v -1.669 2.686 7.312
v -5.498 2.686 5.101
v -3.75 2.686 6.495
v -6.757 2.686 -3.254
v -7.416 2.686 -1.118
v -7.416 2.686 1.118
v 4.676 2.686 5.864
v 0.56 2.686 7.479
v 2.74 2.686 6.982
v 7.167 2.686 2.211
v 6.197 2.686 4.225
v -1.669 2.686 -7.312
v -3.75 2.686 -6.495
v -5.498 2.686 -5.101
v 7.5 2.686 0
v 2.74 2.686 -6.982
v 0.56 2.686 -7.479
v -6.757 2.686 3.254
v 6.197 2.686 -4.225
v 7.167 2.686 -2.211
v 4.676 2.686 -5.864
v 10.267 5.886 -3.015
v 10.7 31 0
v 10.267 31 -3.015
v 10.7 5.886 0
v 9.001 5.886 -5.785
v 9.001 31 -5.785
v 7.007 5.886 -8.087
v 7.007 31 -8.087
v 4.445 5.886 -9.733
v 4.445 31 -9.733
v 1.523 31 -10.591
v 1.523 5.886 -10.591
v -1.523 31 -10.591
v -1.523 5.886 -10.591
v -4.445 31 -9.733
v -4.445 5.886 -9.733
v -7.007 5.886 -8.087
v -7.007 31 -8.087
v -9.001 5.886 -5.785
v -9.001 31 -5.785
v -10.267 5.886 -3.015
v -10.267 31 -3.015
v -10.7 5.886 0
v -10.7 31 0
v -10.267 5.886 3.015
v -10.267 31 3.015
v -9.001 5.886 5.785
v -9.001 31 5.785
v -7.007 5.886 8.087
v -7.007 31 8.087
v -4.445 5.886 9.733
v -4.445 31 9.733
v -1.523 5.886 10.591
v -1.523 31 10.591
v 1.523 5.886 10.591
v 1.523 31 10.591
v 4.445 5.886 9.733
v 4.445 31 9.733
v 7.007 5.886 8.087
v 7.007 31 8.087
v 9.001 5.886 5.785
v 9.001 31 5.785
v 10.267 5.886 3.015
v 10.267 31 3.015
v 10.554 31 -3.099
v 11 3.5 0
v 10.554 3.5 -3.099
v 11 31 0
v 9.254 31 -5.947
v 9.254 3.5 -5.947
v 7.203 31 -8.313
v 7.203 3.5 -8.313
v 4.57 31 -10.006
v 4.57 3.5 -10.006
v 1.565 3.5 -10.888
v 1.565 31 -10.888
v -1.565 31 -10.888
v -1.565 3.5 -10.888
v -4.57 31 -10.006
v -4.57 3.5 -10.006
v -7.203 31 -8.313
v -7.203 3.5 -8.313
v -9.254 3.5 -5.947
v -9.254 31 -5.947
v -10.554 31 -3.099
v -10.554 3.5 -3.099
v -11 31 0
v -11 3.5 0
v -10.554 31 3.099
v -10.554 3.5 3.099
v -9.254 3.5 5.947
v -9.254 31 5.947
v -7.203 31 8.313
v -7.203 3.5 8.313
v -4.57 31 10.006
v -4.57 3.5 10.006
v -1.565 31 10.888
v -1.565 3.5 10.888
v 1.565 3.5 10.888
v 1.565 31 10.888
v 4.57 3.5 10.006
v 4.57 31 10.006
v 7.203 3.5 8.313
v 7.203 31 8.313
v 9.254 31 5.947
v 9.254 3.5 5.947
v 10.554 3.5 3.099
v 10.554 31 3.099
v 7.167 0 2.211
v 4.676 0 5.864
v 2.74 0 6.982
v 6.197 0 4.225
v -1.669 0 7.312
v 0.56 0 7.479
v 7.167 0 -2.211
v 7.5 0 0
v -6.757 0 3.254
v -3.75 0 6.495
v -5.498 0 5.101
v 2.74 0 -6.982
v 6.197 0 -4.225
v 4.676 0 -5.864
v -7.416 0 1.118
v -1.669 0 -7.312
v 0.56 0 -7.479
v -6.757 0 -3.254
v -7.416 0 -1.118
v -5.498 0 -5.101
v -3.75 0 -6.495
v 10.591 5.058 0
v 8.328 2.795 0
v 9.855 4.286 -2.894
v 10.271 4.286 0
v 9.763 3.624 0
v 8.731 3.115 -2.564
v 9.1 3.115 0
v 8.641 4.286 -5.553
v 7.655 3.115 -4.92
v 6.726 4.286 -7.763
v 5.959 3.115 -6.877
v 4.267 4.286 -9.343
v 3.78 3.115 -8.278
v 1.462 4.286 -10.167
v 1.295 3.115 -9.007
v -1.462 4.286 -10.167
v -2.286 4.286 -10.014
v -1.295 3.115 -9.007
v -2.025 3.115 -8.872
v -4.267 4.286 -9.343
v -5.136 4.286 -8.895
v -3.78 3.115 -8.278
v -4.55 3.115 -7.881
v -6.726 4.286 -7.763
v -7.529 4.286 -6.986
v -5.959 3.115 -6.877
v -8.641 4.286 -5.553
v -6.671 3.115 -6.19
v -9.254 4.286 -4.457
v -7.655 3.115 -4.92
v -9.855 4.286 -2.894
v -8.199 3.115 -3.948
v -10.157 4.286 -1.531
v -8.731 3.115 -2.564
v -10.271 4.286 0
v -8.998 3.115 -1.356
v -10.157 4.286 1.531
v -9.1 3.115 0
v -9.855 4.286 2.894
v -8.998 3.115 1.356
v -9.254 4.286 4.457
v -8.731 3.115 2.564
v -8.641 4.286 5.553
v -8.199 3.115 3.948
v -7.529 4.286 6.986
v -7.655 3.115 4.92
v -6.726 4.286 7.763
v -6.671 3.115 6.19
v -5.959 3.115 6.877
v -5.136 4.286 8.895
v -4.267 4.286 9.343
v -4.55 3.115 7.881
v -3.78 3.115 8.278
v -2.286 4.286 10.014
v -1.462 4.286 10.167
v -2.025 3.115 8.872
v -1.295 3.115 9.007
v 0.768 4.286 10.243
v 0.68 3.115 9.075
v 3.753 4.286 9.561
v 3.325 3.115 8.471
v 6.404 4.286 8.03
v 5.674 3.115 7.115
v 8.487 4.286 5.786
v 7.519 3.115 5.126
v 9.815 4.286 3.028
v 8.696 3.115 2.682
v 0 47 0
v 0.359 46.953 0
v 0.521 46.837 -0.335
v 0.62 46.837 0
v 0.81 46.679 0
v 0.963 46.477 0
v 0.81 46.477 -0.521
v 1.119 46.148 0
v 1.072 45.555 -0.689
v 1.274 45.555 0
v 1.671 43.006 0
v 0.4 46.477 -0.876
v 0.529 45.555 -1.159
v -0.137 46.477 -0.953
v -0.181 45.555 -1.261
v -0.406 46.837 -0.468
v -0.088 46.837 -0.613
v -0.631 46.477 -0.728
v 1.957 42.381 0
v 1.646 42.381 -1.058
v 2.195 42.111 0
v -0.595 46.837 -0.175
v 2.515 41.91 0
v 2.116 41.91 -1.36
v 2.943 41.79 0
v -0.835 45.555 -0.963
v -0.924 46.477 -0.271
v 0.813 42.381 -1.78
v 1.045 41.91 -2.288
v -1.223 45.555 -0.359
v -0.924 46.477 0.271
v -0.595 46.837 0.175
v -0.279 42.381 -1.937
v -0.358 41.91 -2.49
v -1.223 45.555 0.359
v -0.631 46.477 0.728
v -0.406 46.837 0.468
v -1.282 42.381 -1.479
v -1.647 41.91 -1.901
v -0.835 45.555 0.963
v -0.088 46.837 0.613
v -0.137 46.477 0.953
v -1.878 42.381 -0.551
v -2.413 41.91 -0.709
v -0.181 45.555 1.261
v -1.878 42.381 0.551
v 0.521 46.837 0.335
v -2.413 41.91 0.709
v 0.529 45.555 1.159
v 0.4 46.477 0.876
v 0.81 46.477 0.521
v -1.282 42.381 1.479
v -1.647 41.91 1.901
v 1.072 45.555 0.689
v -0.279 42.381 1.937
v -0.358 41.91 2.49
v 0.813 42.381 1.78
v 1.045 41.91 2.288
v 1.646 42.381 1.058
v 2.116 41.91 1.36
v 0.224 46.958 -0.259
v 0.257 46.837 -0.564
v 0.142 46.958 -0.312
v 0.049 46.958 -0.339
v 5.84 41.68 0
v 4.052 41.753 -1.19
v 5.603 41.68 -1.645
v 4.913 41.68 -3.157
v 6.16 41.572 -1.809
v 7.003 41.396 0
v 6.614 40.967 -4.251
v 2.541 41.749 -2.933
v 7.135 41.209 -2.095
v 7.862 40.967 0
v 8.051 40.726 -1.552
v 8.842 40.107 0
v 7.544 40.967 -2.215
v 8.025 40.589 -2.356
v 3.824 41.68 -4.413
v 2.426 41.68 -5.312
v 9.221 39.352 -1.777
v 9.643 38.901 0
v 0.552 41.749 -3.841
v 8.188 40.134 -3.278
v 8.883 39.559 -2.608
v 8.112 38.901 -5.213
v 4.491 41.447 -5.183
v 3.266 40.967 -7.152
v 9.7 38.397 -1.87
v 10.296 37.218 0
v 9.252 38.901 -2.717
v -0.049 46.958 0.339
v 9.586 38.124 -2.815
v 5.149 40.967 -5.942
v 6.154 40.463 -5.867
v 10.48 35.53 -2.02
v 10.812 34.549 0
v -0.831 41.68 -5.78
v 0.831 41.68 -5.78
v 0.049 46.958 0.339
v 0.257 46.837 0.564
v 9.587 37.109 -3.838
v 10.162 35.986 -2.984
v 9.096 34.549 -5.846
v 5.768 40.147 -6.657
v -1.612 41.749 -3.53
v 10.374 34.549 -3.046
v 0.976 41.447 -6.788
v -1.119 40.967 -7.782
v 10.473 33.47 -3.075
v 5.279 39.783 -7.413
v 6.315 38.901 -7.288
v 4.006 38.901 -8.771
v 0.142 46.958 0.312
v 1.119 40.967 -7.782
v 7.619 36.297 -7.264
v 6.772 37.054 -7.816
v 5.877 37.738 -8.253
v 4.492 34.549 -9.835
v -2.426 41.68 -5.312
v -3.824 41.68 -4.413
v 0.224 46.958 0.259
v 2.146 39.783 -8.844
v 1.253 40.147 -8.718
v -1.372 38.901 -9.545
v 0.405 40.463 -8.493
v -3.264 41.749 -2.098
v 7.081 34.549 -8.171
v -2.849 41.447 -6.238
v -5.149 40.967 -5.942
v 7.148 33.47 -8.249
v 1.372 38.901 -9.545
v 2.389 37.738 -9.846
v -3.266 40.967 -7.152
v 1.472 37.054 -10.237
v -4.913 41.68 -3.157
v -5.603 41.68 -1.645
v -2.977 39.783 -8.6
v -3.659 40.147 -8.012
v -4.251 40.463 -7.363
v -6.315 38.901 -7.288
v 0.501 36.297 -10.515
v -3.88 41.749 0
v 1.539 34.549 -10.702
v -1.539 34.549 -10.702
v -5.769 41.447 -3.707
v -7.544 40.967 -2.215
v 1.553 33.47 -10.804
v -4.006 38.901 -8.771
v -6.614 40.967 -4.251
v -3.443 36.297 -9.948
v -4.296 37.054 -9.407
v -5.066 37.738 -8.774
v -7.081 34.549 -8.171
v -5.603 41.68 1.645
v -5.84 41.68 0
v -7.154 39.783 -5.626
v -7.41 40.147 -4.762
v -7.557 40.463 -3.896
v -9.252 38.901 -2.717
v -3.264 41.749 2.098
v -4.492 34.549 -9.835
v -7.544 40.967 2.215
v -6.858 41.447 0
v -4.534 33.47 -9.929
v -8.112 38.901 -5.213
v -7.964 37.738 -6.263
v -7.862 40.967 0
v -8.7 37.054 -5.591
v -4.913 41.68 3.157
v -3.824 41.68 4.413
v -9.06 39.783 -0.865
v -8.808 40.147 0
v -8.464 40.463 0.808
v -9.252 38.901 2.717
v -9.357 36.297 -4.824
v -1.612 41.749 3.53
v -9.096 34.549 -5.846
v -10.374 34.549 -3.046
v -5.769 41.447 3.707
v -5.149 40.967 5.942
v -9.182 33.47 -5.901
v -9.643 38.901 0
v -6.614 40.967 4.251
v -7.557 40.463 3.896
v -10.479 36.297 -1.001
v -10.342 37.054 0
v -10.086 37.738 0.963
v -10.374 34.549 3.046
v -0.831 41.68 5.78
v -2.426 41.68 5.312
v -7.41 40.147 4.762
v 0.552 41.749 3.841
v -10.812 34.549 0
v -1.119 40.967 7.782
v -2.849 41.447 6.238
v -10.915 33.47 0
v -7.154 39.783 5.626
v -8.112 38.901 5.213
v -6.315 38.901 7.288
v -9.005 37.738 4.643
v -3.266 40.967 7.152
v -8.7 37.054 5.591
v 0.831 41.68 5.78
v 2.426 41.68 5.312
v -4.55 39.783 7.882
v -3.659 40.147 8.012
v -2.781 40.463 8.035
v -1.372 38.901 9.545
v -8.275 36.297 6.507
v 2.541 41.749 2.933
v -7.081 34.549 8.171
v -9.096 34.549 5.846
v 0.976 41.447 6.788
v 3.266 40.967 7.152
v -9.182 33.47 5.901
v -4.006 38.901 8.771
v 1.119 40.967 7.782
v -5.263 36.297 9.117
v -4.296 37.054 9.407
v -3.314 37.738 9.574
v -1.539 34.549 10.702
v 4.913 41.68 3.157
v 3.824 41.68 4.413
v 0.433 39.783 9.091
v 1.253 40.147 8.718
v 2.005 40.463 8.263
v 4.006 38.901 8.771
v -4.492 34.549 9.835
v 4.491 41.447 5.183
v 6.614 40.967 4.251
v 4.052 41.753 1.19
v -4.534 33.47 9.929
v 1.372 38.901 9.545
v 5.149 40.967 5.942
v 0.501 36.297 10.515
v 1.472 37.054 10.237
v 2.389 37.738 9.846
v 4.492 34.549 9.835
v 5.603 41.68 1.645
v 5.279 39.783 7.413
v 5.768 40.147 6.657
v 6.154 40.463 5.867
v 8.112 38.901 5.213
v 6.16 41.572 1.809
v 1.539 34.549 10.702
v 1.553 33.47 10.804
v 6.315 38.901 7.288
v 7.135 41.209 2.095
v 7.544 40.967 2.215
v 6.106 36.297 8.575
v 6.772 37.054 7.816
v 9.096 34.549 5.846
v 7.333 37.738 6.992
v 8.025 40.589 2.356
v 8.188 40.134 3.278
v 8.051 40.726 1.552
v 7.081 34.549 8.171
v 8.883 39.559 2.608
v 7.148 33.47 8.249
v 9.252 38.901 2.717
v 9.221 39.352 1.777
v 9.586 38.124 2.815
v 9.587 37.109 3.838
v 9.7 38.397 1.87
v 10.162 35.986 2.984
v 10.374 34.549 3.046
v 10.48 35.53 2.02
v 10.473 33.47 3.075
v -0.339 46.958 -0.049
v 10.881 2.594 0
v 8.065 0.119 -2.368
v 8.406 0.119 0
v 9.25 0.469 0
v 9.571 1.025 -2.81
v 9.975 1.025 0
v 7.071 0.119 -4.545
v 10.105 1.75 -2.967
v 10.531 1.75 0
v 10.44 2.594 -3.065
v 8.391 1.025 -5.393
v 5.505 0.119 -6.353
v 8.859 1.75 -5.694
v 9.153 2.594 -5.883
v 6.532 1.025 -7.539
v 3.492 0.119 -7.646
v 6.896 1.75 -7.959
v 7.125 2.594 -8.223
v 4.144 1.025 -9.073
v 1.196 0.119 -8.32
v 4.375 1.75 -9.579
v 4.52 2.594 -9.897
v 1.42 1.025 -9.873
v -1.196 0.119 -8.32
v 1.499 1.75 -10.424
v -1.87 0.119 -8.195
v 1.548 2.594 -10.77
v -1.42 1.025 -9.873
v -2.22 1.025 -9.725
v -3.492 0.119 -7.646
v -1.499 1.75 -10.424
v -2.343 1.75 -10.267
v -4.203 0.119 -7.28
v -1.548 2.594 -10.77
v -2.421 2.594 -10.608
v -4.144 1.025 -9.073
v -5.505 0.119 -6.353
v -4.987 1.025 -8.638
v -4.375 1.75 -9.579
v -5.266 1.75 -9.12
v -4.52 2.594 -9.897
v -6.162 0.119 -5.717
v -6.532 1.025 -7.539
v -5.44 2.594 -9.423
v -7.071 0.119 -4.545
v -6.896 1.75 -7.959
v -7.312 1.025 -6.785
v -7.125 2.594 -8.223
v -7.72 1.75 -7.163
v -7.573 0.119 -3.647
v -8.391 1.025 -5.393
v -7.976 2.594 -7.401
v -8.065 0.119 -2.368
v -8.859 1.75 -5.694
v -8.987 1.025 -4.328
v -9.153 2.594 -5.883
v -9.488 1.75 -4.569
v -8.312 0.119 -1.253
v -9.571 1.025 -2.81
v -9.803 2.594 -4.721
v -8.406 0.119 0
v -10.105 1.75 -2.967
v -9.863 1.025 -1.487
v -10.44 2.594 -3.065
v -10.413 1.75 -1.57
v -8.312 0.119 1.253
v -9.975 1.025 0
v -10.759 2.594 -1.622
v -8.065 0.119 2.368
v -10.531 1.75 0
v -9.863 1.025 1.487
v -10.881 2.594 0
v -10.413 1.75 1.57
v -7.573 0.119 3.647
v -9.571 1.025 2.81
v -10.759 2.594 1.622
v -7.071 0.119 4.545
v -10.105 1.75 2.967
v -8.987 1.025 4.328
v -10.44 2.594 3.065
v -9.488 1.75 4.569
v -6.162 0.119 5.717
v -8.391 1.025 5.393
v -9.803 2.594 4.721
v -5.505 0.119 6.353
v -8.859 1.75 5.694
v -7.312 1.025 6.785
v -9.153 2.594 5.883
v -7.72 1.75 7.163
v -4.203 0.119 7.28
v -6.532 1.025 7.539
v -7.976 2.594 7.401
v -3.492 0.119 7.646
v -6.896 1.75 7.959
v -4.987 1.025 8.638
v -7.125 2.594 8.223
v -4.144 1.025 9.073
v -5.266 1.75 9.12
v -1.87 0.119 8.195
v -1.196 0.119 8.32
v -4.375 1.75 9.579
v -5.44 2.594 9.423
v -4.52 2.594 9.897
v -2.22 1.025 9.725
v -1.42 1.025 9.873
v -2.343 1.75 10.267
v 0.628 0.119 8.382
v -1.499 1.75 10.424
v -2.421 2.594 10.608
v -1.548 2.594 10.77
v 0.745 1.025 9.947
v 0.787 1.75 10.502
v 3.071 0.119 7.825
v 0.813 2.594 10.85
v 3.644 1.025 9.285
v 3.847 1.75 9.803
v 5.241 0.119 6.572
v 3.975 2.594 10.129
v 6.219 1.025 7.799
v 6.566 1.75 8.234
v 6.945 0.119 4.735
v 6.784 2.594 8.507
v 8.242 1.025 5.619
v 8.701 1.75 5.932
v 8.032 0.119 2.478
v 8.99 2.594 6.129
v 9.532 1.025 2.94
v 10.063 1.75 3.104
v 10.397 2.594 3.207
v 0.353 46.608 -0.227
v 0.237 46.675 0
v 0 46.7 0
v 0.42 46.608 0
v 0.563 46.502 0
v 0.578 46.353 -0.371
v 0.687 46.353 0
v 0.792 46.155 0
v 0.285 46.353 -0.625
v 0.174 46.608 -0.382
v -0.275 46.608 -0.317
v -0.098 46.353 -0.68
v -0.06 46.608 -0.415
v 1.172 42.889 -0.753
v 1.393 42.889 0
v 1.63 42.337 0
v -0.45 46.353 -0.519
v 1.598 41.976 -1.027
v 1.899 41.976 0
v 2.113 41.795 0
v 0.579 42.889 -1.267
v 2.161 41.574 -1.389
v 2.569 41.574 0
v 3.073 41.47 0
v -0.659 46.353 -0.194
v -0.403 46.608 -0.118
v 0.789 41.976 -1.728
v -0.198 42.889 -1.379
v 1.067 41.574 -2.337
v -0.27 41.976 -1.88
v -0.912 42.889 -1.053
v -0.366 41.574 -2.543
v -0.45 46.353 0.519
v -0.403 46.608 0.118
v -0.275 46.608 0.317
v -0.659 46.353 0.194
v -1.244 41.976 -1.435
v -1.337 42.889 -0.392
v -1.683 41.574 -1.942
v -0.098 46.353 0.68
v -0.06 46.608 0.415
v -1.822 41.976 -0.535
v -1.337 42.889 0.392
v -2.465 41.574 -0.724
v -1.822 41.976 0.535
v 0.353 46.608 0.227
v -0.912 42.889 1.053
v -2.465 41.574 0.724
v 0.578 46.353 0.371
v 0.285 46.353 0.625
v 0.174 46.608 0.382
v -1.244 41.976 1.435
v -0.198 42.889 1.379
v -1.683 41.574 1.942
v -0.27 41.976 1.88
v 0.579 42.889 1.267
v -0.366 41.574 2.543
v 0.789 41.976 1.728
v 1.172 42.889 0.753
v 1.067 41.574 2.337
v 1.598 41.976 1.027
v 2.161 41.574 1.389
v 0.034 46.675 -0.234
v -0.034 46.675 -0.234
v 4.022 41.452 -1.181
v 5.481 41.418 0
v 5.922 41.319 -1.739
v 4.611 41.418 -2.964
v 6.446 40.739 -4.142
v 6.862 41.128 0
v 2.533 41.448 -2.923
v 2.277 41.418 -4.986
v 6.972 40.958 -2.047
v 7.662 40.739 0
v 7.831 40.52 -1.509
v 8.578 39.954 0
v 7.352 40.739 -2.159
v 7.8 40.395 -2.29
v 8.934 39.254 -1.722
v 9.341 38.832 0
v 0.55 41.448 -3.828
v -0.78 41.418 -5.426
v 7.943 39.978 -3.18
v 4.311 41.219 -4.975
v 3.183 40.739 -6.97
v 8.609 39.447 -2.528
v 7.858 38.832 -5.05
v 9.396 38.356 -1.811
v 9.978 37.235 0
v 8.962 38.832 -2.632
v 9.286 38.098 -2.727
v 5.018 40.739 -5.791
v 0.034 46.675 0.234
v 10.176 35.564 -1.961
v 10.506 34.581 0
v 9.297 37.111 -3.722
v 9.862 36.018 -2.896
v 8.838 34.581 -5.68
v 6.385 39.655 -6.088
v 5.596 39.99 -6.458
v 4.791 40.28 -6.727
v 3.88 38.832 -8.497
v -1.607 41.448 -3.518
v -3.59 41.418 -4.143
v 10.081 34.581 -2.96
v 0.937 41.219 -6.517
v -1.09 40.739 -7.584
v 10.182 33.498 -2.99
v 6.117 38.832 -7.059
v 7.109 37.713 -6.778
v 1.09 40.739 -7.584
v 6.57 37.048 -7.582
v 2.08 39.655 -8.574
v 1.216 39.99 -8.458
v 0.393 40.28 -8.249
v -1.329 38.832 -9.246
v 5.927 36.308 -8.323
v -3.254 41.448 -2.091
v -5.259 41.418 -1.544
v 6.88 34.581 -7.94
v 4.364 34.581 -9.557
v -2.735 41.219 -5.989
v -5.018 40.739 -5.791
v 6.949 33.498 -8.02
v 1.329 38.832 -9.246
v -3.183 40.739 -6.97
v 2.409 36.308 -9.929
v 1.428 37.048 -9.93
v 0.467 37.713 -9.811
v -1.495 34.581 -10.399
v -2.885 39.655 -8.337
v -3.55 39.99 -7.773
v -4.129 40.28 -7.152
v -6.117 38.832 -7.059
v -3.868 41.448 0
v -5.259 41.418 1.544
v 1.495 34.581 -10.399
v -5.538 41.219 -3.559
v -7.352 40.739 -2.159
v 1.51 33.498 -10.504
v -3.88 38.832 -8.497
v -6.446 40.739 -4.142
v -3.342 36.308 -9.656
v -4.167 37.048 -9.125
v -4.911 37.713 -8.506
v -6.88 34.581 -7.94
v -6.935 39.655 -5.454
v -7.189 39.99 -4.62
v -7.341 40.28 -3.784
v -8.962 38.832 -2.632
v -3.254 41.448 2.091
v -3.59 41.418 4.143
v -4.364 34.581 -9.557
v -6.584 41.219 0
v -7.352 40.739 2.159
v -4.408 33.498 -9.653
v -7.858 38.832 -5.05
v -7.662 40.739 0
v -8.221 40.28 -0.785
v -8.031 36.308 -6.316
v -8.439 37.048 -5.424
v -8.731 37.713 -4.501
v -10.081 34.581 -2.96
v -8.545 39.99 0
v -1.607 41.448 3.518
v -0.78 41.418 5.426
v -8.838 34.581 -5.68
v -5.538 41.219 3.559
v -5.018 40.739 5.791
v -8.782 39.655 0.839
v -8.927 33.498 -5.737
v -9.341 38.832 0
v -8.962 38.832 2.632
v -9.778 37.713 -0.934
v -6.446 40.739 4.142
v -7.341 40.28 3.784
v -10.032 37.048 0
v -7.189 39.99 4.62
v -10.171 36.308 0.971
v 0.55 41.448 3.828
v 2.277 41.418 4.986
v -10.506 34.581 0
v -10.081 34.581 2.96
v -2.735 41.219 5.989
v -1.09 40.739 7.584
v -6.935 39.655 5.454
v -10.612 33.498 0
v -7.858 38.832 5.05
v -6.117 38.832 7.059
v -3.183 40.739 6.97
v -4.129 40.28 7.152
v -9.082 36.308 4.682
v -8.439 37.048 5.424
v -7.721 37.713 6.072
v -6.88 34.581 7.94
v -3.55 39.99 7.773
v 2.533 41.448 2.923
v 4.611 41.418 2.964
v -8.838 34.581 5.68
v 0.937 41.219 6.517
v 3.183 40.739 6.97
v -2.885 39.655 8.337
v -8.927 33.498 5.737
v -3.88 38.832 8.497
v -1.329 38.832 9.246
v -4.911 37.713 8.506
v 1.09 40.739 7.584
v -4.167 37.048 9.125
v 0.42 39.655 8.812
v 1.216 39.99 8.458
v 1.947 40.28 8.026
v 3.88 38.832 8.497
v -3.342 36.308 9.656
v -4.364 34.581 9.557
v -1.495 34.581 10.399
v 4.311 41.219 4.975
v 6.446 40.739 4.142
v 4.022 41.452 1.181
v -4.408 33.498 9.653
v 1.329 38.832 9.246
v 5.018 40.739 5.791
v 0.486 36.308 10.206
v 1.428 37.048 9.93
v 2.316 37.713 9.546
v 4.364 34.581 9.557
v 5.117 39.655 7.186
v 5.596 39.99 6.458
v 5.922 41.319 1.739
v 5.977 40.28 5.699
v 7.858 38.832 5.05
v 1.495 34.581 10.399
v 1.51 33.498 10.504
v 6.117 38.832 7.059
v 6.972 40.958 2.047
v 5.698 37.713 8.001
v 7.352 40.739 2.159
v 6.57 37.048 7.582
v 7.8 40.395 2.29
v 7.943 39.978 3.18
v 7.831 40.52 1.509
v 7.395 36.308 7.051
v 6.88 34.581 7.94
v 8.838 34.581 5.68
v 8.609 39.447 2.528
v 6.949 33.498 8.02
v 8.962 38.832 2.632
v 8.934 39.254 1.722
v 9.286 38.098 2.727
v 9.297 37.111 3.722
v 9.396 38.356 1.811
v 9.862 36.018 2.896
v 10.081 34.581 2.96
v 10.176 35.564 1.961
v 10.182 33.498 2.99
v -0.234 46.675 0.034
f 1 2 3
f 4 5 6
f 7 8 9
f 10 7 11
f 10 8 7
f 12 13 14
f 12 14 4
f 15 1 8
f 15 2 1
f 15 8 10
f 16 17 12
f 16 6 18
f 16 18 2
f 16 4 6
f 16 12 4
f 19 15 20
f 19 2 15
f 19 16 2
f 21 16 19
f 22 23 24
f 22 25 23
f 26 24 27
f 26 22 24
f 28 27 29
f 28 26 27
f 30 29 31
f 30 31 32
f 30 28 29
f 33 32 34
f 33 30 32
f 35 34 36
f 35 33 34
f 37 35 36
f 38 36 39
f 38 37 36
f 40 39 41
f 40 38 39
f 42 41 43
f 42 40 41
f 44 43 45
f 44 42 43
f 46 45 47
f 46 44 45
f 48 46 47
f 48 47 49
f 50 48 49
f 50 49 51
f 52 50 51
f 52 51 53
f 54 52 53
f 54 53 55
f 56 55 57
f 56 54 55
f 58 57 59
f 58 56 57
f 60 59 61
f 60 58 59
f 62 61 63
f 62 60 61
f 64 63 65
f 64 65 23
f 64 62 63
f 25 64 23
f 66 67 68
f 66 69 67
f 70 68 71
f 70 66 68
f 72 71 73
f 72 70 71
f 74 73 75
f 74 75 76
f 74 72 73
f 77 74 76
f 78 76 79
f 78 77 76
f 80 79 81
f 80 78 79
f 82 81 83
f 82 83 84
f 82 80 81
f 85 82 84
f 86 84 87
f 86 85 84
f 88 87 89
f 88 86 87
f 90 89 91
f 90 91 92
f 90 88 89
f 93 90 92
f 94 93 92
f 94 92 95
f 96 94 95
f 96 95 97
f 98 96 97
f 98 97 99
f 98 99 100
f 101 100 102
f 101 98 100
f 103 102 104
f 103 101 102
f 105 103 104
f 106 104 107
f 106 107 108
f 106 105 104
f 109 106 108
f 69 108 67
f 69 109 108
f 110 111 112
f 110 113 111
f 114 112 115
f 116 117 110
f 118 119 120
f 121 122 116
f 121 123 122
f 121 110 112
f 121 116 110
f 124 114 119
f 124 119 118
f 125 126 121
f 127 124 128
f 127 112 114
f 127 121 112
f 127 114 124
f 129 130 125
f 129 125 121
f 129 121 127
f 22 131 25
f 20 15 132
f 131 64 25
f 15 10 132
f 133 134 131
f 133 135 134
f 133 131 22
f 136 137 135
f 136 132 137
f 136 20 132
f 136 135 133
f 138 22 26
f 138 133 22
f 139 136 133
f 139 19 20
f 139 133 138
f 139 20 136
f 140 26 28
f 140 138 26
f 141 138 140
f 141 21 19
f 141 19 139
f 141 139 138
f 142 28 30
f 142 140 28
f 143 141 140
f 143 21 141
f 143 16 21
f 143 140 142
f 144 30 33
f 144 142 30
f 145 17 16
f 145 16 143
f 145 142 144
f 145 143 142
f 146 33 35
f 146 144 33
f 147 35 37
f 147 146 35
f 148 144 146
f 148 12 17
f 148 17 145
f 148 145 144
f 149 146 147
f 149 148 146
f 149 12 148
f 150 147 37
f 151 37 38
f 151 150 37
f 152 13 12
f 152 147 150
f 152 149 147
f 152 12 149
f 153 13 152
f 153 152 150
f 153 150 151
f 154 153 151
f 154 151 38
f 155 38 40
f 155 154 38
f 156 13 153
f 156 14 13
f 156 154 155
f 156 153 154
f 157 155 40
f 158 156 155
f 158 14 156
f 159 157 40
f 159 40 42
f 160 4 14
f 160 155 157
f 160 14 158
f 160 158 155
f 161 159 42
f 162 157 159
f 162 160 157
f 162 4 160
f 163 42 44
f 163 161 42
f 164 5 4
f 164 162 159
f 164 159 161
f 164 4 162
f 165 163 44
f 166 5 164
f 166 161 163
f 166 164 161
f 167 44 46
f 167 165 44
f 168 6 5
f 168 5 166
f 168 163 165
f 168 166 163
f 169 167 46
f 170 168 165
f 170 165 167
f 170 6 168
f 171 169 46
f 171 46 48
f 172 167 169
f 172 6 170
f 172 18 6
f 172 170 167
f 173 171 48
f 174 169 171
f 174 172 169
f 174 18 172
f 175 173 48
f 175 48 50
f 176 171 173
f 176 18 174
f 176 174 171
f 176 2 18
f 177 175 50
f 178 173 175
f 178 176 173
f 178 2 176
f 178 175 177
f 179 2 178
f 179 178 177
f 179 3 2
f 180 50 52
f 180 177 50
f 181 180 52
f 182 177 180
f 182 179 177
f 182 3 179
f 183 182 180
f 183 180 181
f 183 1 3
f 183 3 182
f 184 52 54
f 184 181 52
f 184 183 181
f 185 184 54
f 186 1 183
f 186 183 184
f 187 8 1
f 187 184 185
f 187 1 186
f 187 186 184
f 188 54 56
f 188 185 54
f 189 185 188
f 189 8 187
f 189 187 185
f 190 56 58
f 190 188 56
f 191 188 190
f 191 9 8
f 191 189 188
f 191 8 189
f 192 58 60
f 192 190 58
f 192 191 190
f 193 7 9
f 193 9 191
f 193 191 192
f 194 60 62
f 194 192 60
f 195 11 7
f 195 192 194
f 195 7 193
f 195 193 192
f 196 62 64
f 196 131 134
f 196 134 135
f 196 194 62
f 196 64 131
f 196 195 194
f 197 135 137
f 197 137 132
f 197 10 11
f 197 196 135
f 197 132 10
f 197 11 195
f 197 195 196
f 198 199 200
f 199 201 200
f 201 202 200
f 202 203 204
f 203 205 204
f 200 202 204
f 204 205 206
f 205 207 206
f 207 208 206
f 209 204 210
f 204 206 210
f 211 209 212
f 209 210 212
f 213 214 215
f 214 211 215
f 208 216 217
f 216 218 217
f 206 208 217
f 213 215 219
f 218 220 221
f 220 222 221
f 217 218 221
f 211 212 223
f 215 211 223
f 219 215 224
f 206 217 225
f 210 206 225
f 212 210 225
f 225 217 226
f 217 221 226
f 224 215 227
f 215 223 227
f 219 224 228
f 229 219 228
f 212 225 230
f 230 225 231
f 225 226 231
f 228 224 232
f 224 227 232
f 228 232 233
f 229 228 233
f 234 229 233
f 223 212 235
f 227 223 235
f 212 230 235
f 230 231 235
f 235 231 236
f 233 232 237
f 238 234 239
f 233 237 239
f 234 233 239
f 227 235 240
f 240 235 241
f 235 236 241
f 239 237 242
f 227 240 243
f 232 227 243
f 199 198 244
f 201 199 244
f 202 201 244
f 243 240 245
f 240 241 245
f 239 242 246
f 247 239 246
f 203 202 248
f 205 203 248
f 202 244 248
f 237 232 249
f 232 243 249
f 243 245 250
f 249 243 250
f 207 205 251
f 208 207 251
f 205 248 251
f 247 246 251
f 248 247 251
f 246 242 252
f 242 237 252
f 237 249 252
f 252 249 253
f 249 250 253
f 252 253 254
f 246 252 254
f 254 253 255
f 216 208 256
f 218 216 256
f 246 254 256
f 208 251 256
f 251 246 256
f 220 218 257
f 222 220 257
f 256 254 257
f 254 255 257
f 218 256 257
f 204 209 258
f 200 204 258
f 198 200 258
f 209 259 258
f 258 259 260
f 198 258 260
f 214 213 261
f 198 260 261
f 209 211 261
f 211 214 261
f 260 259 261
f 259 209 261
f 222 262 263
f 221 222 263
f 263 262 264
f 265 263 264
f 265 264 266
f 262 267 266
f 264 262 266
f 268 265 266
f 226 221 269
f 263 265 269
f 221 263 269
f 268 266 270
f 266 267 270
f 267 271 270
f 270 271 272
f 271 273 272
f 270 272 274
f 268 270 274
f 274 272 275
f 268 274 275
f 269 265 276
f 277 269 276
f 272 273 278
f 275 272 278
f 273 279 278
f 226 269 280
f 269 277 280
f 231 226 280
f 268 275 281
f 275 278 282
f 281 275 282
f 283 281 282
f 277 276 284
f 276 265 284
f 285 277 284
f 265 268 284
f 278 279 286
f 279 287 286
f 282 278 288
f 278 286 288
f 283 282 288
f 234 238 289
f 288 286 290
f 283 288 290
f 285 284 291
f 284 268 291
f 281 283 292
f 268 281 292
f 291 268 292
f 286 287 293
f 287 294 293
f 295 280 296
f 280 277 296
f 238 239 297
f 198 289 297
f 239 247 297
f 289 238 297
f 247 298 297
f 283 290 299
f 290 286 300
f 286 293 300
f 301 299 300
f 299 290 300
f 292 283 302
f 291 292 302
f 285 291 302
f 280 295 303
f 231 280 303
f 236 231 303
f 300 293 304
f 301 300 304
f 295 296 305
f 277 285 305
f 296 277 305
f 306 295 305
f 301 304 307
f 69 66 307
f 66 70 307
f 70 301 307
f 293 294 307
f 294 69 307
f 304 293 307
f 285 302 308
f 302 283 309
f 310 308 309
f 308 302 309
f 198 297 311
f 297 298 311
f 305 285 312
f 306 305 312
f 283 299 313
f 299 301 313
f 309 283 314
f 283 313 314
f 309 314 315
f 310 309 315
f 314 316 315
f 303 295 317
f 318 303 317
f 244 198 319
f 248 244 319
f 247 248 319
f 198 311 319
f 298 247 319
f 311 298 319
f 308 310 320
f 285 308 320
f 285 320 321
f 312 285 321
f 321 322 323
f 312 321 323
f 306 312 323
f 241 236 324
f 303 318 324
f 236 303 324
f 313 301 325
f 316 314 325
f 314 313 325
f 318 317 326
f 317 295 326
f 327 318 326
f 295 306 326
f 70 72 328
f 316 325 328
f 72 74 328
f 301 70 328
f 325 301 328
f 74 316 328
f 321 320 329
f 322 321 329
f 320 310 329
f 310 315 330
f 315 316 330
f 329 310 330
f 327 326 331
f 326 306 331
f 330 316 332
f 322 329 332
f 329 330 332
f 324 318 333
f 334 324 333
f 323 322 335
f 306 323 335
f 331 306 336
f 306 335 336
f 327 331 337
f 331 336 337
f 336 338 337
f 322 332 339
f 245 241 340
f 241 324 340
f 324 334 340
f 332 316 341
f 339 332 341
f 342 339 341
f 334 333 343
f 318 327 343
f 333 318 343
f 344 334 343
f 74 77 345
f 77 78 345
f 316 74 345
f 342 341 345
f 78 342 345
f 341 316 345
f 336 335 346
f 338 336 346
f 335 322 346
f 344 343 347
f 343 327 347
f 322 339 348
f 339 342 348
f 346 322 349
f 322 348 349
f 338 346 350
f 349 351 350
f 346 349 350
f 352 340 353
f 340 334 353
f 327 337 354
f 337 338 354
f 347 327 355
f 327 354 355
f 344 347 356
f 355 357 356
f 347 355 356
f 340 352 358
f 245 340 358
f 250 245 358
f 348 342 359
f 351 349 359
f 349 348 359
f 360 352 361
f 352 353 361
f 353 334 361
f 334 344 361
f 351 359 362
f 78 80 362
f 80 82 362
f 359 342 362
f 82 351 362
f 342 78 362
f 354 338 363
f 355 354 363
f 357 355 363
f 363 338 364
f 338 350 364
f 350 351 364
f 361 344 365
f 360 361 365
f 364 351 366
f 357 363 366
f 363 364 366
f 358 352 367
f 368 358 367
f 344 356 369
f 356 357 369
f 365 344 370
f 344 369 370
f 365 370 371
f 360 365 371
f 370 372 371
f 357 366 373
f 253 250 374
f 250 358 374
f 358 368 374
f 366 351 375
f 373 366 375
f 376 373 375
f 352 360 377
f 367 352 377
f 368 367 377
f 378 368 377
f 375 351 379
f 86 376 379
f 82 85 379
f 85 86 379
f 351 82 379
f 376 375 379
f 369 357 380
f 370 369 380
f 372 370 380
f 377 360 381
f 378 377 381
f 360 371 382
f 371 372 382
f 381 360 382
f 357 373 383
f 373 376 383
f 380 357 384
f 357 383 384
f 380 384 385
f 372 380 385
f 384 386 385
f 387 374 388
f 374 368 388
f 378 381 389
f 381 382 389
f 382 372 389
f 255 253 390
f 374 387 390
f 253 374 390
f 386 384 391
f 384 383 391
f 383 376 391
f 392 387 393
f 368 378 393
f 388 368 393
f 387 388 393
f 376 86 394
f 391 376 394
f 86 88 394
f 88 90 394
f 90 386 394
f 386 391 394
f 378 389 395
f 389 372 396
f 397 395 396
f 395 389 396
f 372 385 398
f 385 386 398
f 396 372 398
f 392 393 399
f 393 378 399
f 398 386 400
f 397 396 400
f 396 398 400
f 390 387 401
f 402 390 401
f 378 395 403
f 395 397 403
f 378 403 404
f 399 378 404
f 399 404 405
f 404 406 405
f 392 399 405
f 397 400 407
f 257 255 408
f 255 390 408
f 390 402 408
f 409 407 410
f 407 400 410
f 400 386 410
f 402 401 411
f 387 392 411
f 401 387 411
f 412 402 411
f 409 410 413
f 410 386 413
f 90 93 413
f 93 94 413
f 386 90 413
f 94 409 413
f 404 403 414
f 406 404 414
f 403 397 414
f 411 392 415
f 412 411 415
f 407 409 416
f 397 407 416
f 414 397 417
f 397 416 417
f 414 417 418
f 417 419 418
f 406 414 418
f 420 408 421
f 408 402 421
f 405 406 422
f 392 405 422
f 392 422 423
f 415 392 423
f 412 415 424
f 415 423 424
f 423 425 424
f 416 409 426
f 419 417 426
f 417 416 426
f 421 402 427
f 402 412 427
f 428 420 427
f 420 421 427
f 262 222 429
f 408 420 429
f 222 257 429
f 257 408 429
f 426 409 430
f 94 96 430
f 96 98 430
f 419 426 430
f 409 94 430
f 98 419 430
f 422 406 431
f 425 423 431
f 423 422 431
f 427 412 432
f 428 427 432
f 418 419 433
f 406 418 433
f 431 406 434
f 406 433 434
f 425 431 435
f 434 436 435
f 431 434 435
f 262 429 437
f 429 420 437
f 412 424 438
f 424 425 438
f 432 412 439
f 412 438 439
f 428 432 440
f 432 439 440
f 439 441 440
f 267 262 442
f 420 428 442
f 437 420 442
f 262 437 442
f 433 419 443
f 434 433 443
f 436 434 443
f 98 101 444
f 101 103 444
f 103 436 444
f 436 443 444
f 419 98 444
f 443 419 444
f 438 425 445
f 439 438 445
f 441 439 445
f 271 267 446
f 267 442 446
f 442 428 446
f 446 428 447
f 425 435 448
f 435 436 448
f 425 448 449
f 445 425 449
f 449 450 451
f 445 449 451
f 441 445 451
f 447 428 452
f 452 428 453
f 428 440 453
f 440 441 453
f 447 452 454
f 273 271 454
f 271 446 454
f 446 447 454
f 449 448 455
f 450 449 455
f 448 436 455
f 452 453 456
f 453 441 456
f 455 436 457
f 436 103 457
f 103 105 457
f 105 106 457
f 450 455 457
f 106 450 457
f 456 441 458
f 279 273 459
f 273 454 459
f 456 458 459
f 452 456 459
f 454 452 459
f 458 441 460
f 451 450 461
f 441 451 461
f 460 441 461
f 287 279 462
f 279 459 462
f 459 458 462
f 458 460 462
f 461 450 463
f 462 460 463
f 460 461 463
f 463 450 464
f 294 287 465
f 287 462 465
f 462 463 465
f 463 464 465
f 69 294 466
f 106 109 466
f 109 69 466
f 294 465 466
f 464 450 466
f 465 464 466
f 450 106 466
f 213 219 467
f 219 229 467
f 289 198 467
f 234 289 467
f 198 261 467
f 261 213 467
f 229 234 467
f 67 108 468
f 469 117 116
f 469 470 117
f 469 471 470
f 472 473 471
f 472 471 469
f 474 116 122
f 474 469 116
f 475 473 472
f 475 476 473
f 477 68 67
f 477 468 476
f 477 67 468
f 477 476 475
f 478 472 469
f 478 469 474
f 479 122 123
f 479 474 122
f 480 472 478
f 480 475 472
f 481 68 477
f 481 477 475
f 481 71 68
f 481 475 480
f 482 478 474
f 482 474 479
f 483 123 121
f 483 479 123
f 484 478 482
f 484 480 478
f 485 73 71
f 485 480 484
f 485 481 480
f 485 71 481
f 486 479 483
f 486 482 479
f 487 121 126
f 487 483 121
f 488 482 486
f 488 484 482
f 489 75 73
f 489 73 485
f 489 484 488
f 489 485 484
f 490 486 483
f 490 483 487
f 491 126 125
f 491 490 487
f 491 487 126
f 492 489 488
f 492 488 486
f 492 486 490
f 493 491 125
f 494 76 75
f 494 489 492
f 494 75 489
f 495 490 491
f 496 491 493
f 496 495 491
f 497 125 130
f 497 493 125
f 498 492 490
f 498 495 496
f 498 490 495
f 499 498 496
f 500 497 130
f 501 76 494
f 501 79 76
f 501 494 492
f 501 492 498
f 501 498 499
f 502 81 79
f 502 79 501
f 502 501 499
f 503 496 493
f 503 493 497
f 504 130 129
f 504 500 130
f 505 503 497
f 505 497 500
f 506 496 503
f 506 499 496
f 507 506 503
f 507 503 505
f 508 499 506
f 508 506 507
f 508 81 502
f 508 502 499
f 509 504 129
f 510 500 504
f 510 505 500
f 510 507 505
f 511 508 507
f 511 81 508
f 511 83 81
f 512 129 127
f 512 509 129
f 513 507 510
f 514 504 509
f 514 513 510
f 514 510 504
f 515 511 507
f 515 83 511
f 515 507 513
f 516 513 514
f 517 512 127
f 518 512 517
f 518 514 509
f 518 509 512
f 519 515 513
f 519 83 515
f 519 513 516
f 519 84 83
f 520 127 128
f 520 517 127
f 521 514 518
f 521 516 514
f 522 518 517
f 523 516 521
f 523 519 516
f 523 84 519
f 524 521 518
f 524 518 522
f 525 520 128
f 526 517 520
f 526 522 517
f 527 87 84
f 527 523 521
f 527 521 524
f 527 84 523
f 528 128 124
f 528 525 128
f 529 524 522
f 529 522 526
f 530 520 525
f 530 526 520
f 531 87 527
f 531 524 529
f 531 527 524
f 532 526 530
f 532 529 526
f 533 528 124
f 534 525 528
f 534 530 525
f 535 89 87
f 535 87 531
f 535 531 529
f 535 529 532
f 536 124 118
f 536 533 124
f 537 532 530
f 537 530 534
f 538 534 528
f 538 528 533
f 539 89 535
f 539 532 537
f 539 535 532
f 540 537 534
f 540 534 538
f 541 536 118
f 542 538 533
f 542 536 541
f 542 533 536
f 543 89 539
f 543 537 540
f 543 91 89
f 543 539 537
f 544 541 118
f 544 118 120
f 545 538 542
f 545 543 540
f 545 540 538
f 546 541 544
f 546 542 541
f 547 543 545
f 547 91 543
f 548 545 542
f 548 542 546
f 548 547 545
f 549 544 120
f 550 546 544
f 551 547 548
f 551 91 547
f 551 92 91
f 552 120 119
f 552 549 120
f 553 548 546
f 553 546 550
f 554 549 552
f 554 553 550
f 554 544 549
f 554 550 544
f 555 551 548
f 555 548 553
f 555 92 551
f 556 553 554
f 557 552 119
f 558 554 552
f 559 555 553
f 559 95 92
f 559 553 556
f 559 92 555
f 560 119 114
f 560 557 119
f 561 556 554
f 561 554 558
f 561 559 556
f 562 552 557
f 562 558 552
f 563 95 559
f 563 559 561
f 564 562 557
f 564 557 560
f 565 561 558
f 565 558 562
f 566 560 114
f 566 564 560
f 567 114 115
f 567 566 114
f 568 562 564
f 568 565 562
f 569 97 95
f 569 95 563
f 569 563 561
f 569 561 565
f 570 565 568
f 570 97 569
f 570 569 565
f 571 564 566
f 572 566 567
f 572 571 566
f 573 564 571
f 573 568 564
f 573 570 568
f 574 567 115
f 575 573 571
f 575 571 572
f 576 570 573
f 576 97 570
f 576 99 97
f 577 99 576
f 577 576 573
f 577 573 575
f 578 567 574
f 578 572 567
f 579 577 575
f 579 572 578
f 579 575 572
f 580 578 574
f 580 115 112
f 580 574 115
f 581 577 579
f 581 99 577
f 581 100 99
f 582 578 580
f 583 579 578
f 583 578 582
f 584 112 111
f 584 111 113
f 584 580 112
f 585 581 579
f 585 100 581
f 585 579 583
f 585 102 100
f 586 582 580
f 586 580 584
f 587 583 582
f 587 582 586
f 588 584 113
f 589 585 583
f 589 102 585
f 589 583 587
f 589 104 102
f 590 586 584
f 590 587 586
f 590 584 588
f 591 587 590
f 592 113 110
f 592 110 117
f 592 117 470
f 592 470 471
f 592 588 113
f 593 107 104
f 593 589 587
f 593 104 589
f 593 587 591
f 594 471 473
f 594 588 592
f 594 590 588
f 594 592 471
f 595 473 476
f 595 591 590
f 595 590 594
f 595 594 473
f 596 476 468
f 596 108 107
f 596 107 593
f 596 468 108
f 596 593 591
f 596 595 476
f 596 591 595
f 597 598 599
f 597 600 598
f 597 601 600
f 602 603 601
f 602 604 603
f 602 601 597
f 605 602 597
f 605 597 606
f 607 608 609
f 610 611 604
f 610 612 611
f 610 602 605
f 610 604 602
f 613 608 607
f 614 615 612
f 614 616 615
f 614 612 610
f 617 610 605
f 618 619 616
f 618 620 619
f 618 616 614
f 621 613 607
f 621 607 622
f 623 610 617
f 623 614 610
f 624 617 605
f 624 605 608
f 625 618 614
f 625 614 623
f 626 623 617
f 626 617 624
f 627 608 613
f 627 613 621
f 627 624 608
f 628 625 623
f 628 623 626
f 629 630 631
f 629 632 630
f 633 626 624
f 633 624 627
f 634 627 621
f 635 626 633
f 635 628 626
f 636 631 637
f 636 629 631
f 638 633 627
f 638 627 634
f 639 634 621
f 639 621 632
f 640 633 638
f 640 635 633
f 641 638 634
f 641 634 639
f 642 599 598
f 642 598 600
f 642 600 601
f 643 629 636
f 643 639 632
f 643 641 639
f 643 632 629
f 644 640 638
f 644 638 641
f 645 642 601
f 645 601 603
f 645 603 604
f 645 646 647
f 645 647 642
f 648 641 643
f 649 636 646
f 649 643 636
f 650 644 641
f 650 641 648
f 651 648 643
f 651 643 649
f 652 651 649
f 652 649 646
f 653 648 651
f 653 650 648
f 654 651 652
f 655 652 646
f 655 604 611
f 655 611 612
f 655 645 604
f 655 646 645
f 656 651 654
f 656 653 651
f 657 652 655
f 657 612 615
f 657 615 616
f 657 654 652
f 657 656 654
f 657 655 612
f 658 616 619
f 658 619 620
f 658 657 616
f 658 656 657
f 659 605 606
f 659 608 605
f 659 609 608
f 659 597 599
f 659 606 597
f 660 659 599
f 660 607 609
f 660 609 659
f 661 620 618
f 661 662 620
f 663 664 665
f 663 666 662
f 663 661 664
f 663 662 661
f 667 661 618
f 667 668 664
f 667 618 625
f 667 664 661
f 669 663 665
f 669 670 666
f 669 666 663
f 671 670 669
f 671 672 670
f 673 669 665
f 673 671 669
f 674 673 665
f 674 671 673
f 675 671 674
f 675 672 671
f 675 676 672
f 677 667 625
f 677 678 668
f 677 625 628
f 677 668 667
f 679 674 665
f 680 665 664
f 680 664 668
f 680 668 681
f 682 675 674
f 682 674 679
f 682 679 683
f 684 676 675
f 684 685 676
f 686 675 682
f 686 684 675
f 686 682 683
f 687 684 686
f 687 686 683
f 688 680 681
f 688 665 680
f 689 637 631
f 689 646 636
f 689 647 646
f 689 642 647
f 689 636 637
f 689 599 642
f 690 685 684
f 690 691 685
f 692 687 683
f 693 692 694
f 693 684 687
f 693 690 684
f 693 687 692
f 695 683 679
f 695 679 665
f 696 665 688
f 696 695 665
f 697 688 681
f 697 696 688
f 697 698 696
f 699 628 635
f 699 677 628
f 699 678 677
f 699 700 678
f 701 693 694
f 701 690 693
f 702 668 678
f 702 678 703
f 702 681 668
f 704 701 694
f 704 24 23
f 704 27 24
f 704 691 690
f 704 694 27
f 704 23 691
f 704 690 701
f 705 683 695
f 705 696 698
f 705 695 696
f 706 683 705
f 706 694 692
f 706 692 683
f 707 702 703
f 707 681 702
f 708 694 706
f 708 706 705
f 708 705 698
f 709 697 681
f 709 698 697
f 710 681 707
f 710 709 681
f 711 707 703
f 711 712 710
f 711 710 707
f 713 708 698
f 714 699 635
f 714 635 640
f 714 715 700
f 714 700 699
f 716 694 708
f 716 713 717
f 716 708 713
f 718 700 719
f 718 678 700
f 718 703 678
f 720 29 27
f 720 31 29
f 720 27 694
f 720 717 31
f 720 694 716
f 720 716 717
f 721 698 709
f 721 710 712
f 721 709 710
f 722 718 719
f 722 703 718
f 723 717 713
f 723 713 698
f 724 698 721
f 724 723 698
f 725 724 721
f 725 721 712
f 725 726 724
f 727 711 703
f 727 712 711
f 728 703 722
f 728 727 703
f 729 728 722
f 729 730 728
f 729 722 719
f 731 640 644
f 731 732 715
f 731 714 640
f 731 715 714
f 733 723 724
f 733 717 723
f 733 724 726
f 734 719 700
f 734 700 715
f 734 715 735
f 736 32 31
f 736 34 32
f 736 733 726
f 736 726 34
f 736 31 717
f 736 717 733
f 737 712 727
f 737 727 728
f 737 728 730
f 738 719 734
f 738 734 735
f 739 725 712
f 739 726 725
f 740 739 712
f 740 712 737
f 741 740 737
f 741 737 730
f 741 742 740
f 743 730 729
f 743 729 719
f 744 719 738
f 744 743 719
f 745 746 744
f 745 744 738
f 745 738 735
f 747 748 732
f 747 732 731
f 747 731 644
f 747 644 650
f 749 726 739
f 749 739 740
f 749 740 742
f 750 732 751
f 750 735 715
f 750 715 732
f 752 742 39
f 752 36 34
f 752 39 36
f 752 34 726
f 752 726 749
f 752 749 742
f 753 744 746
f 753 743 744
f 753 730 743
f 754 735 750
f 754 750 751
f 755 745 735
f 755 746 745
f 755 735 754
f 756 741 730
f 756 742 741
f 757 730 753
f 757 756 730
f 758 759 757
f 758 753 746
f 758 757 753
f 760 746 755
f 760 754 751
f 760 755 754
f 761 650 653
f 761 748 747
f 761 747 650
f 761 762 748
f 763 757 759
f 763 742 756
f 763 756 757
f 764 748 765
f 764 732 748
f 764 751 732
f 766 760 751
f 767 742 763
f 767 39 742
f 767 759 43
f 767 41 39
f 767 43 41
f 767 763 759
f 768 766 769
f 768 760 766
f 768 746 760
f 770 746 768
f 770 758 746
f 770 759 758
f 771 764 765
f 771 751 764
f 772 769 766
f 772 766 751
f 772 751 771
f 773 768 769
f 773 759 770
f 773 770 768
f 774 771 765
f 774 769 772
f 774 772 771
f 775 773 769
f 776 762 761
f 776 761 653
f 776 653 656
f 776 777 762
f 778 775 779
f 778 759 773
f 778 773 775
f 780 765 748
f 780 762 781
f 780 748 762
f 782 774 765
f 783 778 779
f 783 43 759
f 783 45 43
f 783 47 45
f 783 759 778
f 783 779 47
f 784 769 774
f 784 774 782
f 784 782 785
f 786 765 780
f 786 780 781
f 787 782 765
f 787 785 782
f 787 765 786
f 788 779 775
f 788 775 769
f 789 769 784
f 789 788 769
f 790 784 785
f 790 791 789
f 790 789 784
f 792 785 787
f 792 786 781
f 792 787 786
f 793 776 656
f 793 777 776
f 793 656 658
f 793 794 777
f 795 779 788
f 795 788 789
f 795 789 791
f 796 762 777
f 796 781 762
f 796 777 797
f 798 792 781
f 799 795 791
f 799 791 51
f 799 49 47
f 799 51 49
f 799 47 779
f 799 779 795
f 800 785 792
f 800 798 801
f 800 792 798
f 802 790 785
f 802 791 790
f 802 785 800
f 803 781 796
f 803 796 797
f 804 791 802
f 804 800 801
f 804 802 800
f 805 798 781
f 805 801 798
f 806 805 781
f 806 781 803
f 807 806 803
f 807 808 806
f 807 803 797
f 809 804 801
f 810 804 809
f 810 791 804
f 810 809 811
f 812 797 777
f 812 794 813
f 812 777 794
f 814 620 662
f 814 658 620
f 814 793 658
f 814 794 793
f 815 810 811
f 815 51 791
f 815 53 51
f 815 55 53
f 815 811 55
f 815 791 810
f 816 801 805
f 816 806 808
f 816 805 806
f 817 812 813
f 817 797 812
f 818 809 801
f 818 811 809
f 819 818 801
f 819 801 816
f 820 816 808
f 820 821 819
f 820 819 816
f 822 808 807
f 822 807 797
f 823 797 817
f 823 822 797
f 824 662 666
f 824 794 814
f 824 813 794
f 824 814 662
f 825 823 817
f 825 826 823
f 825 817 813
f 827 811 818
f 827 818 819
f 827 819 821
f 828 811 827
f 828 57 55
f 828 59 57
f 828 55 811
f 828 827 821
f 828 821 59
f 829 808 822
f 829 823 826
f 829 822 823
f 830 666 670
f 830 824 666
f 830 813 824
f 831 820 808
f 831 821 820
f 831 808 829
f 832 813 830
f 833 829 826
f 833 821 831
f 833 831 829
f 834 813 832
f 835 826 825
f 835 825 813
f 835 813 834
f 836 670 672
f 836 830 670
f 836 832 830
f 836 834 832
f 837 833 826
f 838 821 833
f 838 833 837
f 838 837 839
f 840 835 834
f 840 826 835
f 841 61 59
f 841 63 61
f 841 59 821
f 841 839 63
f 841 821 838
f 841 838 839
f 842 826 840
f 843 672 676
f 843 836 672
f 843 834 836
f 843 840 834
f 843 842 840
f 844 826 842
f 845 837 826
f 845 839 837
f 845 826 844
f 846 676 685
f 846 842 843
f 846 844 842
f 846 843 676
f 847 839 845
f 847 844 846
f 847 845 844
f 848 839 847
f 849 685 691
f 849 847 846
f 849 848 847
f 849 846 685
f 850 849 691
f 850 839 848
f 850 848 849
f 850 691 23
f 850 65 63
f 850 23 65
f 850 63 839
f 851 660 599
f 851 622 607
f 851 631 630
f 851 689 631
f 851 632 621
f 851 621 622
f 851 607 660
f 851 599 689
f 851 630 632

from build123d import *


with BuildPart() as part:
    # Sketch1 → Revolve1 (revolve)
    with BuildSketch(Plane.XY):
        with BuildLine():
            Line((0, 0), (7.5, 0))
            ThreePointArc((7.5, 0), (9.974873734, 1.025126266), (11, 3.5))
            Line((11, 3.5), (11, 31))
            add(Edge.make_bspline(
                [(0, 47), (1.868508868, 47), (0.839979319, 43.098036716), (3.690772078, 40.909332335), (11, 43.731932555), (11, 31)],
                knots=[0, 0, 0, 0, 0.457352926, 0.557352926, 1, 1, 1, 1], degree=3))
            Line((0, 47), (0, 46.7))
            add(Edge.make_bspline(
                [(0, 46.7), (0.089835783, 46.7), (0.286730482, 46.675440139), (0.526826616, 46.561370695), (0.862385089, 46.18251662), (1.044651981, 45.207868135), (1.153282995, 44.076896377), (1.27957898, 43.224881421), (1.526130511, 42.440350235), (2.004678842, 41.769741959), (2.893610253, 41.423589513), (4.086898349, 41.455426541), (5.493916716, 41.46358206), (6.96424187, 41.18629835), (8.123784424, 40.497710935), (8.965606732, 39.51470229), (9.535509298, 38.514305141), (10.020875278, 37.207692702), (10.397250109, 35.559145848), (10.600364695, 33.859238186), (10.685249745, 32.308941091), (10.7, 31.427518579), (10.7, 31)],
                knots=[0, 0, 0, 0, 0.03125, 0.0625, 0.125, 0.25, 0.3125, 0.375, 0.4375, 0.5, 0.5625, 0.625, 0.6875, 0.75, 0.8125, 0.84375, 0.875, 0.90625, 0.9375, 0.96875, 0.984375, 1, 1, 1, 1], degree=3))
            Line((10.7, 31), (10.7, 5.88640066))
            ThreePointArc((10.7, 5.88640066), (9.7627417, 3.62365896), (7.5, 2.68640066))
            Line((7.5, 2.68640066), (0, 2.68640066))
            Line((0, 2.68640066), (0, 0.3))
            Line((0, 0.3), (0, 0))
        make_face()
    revolve(axis=Axis((0, 0, 0), (0, 1, 0)))


solid = part.part
